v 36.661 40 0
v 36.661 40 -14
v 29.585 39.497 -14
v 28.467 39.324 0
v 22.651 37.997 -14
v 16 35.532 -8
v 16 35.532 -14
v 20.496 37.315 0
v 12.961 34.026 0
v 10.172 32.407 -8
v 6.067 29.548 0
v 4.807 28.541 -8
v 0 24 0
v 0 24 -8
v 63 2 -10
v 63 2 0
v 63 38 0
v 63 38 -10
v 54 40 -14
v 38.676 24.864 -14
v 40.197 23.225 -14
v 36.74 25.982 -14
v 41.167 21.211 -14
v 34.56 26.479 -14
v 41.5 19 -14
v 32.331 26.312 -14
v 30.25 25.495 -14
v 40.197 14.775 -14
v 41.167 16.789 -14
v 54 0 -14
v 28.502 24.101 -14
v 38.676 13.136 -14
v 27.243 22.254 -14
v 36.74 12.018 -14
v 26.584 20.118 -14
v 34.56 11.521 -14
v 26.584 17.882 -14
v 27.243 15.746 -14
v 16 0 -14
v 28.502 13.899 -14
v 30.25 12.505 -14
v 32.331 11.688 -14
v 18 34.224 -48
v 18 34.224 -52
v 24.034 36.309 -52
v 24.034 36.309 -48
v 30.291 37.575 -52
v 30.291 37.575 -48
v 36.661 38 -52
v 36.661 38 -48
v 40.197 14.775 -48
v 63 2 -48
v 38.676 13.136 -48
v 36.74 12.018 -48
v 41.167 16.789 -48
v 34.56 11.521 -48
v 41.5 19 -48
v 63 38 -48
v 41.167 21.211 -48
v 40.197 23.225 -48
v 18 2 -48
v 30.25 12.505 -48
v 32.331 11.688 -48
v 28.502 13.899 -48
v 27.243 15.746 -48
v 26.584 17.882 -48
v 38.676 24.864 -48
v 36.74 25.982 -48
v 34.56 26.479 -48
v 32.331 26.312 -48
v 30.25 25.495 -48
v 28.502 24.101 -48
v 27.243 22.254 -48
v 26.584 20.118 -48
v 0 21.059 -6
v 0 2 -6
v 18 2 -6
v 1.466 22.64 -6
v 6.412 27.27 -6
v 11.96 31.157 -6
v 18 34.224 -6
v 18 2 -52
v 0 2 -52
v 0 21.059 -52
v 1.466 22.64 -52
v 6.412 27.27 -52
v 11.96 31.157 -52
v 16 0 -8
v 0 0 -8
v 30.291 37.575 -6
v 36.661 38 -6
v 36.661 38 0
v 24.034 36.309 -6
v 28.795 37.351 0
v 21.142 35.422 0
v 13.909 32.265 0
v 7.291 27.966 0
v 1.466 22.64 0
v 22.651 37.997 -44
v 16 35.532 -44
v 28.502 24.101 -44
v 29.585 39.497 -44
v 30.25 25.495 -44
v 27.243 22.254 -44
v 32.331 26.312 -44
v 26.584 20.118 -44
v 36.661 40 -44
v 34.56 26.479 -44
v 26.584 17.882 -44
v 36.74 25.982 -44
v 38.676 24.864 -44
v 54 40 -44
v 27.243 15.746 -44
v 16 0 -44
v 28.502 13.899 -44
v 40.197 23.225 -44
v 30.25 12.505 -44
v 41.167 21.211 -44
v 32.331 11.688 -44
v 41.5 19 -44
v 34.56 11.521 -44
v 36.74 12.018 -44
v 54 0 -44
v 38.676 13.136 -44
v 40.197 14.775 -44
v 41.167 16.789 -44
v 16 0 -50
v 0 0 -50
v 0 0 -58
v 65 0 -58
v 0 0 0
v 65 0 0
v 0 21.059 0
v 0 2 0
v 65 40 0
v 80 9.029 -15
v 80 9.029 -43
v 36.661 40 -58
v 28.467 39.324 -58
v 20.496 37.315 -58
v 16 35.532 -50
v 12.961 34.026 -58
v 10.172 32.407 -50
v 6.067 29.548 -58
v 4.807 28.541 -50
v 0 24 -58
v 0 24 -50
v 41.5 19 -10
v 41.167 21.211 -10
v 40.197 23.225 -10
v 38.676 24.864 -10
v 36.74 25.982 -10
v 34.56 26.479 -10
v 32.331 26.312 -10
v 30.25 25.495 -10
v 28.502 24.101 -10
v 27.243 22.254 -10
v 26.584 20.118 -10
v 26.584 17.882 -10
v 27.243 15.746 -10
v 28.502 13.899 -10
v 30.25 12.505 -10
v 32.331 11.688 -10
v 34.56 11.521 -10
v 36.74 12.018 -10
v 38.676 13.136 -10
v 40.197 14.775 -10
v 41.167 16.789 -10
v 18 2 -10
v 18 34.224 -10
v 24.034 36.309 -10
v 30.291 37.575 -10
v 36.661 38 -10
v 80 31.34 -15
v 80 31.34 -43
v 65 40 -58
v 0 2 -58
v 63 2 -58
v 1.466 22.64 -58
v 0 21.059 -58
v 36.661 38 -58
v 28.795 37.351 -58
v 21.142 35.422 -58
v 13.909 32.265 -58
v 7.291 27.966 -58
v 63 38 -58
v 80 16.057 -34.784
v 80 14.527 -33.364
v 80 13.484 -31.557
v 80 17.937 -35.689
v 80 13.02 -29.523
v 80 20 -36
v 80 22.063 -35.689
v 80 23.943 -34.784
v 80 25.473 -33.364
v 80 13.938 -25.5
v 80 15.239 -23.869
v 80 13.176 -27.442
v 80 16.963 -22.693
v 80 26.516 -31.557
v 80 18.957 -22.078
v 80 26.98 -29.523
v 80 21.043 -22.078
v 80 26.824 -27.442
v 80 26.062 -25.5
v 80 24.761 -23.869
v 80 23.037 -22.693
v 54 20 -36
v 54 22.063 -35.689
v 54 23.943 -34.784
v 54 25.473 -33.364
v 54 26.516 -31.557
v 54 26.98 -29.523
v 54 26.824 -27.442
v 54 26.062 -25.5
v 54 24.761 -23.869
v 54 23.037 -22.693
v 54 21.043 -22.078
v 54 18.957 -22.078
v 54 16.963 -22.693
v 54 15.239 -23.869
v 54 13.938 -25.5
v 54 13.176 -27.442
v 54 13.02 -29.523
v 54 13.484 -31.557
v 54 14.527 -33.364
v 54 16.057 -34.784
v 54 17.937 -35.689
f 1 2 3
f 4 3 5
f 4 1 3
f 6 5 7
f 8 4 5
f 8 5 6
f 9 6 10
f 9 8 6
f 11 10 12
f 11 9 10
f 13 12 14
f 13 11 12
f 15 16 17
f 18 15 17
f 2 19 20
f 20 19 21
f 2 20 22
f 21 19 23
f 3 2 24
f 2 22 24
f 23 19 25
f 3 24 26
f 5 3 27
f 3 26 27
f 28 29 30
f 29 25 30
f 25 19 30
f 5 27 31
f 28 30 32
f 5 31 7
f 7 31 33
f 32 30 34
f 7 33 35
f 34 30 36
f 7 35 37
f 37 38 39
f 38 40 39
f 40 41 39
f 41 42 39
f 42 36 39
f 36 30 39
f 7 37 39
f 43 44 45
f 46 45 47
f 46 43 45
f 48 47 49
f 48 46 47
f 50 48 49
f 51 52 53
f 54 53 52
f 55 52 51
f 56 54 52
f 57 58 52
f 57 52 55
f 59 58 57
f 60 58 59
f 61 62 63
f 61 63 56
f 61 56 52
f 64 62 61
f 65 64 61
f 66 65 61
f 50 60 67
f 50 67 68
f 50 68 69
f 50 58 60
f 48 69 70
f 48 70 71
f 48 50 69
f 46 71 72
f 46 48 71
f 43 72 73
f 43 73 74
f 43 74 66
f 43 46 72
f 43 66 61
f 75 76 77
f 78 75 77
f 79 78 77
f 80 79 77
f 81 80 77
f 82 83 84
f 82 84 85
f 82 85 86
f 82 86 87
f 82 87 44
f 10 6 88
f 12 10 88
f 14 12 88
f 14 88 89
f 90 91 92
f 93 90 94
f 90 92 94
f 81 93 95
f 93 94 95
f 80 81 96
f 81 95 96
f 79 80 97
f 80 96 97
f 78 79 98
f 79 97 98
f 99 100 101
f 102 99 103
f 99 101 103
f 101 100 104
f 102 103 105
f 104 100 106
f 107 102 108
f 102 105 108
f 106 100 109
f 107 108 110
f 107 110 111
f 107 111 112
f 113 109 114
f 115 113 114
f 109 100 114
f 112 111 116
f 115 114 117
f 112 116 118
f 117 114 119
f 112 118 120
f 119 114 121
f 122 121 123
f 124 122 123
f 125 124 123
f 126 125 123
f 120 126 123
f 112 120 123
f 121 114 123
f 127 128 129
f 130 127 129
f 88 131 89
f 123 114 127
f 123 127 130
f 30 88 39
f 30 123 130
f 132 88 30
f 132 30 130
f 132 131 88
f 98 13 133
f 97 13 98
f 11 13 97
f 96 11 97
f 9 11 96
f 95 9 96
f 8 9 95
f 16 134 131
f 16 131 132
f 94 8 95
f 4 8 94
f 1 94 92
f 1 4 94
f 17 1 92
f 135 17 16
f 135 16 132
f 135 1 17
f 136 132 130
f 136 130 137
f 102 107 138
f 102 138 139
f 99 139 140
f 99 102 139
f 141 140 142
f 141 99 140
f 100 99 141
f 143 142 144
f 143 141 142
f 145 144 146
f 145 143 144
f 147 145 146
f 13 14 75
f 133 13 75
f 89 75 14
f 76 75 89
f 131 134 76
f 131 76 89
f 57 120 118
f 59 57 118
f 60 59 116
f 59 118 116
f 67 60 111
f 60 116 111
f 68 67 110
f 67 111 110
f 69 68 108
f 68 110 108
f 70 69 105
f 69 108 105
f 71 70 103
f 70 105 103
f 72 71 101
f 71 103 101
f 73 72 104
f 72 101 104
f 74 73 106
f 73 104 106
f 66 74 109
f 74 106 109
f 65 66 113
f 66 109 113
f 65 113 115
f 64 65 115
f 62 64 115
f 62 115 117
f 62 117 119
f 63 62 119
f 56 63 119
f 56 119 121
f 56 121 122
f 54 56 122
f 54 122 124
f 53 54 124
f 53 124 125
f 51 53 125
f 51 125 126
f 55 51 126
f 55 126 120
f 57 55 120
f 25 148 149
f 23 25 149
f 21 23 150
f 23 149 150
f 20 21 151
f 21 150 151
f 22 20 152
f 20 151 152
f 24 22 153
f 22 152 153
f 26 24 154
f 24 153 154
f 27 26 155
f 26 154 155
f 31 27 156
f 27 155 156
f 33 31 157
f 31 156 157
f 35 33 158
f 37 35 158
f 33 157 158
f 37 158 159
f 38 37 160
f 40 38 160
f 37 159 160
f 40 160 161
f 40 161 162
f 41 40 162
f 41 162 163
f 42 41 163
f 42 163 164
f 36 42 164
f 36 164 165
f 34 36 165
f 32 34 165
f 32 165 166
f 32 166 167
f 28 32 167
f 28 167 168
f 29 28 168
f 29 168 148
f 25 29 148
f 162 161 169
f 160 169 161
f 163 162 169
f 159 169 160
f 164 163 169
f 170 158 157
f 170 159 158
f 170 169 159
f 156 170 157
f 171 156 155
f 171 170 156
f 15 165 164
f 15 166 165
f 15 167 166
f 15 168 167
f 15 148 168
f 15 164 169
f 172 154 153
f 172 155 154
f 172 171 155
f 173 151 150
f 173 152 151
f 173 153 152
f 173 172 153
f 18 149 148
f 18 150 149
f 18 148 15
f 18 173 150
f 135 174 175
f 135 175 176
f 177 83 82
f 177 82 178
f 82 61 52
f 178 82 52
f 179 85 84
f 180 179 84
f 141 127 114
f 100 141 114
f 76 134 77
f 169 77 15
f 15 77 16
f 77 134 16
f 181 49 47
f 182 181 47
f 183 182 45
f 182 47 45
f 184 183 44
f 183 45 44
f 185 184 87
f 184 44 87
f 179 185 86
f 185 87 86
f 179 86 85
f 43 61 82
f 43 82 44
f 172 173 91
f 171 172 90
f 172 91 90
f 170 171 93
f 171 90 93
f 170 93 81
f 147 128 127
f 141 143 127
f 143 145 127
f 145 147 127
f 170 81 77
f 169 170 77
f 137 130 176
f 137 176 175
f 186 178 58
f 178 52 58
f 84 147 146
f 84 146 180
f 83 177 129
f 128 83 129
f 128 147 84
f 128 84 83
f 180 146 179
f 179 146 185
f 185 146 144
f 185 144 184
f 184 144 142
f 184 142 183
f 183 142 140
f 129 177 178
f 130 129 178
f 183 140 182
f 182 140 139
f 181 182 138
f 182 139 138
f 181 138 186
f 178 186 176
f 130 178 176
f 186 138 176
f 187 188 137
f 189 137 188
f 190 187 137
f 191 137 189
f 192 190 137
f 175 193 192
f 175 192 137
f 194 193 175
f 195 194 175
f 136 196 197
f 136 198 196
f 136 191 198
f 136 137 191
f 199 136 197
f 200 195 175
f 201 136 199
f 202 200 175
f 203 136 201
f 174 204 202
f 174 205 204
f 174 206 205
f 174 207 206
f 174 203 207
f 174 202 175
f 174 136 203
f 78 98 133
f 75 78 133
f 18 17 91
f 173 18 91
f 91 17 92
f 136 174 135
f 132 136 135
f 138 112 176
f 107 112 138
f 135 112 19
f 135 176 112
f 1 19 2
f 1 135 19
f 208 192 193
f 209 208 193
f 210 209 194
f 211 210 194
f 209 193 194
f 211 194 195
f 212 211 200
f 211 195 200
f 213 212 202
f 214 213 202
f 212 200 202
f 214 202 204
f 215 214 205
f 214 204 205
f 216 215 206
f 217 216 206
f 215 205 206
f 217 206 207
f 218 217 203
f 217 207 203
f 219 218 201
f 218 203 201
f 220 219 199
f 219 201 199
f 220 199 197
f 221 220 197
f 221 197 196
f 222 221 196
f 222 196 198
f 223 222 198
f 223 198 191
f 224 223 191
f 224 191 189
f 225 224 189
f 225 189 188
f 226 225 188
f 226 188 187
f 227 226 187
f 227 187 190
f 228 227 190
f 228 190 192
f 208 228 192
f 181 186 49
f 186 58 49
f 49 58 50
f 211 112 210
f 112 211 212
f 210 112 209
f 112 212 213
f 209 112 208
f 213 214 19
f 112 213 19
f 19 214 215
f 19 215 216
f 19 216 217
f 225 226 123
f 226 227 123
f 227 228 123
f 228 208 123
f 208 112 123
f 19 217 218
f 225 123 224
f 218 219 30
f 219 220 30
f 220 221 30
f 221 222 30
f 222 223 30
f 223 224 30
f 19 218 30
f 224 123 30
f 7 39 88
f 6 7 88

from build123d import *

# Parameters (mm, degrees)
BOSS_EXTRUDE1_DEPTH = 58
SKETCH3_R           = 7.5
CUT_EXTRUDE1_DEPTH  = 107.60206377
CUT_EXTRUDE2_DEPTH  = 107.60206377
CUT_EXTRUDE3_DEPTH  = 107.60206377
SKETCH6_R           = 7
CUT_EXTRUDE4_DEPTH  = 107.60206377
CUT_EXTRUDE5_DEPTH  = 6
CUT_EXTRUDE6_DEPTH  = 4
CUT_EXTRUDE7_START  = -6
CUT_EXTRUDE7_DEPTH  = 6
CUT_EXTRUDE8_START  = -4
CUT_EXTRUDE8_DEPTH  = 4


with BuildPart() as part:
    # Sketch2 → Boss-Extrude1 (new body)
    with BuildSketch(Plane.XY):
        with BuildLine():
            Line((0, 0), (65, 0))
            Line((65, 0), (80, 9.029262631))
            Line((80, 9.029262631), (80, 31.339745962))
            Line((80, 31.339745962), (65, 40))
            Line((65, 40), (36.66060556, 40))
            ThreePointArc((36.66060556, 40), (16.66060556, 35.82575695), (0, 24))
            Line((0, 24), (0, 0))
        make_face()
    extrude(amount=-BOSS_EXTRUDE1_DEPTH)

    # Sketch3 → Cut-Extrude1 (cut, through all)
    with BuildSketch(Plane.XY):
        with Locations((34, 19)):
            Circle(SKETCH3_R)
    extrude(amount=-CUT_EXTRUDE1_DEPTH, mode=Mode.SUBTRACT)

    # Sketch4 → Cut-Extrude2 (cut, through all)
    with BuildSketch(Plane(origin=(0, 0, 0), x_dir=(1, 0, 0), z_dir=(0, 1, 0))):
        Polygon((65, 58), (80, 43), (80, 58), align=None)
        Polygon((80, 0), (80, 15), (65, 0), align=None)
    extrude(amount=CUT_EXTRUDE2_DEPTH, mode=Mode.SUBTRACT)

    # Sketch5 → Cut-Extrude3 (cut, through all)
    with BuildSketch(Plane.XZ):
        Polygon((0, -8), (0, -50), (16, -50), (16, -44), (54, -44), (54, -14), (16, -14), (16, -8), align=None)
    extrude(amount=-CUT_EXTRUDE3_DEPTH, mode=Mode.SUBTRACT)

    # Sketch6 → Cut-Extrude4 (cut, through all)
    with BuildSketch(Plane(origin=(80, 0, 0), x_dir=(0, 0, -1), z_dir=(1, 0, 0))):
        with Locations((29, 20)):
            Circle(SKETCH6_R)
    extrude(amount=-CUT_EXTRUDE4_DEPTH, mode=Mode.SUBTRACT)

    # Sketch8 → Cut-Extrude5 (cut)
    with BuildSketch(Plane.XY):
        with BuildLine():
            Line((1.466424222, 22.64), (0, 21.058823529))
            Line((0, 21.058823529), (0, 2))
            Line((0, 2), (63, 2))
            Line((63, 2), (63, 38))
            Line((63, 38), (36.66060556, 38))
            ThreePointArc((36.66060556, 38), (17.46060556, 33.992726672), (1.466424222, 22.64))
        make_face()
    extrude(amount=-CUT_EXTRUDE5_DEPTH, mode=Mode.SUBTRACT)

    # Sketch9 → Cut-Extrude6 (cut)
    with BuildSketch(Plane.XY.offset(-6)):
        with BuildLine():
            Line((18, 2), (63, 2))
            Line((63, 2), (63, 38))
            Line((63, 38), (36.66060556, 38))
            ThreePointArc((36.66060556, 38), (27.141221384, 37.046586751), (18, 34.224221872))
            Line((18, 34.224221872), (18, 2))
        make_face()
    extrude(amount=-CUT_EXTRUDE6_DEPTH, mode=Mode.SUBTRACT)

    # Sketch10 → Cut-Extrude7 (cut)
    with BuildSketch(Plane(origin=(0, 0, -58), x_dir=(-1, 0, 0), z_dir=(0, 0, -1)).offset(CUT_EXTRUDE7_START)):
        with BuildLine():
            Line((-1.466424222, 22.64), (0, 21.058823529))
            Line((0, 21.058823529), (0, 2))
            Line((0, 2), (-63, 2))
            Line((-63, 2), (-63, 38))
            Line((-63, 38), (-36.66060556, 38))
            ThreePointArc((-36.66060556, 38), (-17.46060556, 33.992726672), (-1.466424222, 22.64))
        make_face()
    extrude(amount=CUT_EXTRUDE7_DEPTH, mode=Mode.SUBTRACT)

    # Sketch11 → Cut-Extrude8 (cut)
    with BuildSketch(Plane(origin=(0, 0, -52), x_dir=(-1, 0, 0), z_dir=(0, 0, -1)).offset(CUT_EXTRUDE8_START)):
        with BuildLine():
            Line((-63, 38), (-63, 2))
            Line((-63, 2), (-18, 2))
            Line((-18, 2), (-18, 34.224221872))
            ThreePointArc((-18, 34.224221872), (-27.141221384, 37.046586751), (-36.66060556, 38))
            Line((-36.66060556, 38), (-63, 38))
        make_face()
    extrude(amount=CUT_EXTRUDE8_DEPTH, mode=Mode.SUBTRACT)


solid = part.part
